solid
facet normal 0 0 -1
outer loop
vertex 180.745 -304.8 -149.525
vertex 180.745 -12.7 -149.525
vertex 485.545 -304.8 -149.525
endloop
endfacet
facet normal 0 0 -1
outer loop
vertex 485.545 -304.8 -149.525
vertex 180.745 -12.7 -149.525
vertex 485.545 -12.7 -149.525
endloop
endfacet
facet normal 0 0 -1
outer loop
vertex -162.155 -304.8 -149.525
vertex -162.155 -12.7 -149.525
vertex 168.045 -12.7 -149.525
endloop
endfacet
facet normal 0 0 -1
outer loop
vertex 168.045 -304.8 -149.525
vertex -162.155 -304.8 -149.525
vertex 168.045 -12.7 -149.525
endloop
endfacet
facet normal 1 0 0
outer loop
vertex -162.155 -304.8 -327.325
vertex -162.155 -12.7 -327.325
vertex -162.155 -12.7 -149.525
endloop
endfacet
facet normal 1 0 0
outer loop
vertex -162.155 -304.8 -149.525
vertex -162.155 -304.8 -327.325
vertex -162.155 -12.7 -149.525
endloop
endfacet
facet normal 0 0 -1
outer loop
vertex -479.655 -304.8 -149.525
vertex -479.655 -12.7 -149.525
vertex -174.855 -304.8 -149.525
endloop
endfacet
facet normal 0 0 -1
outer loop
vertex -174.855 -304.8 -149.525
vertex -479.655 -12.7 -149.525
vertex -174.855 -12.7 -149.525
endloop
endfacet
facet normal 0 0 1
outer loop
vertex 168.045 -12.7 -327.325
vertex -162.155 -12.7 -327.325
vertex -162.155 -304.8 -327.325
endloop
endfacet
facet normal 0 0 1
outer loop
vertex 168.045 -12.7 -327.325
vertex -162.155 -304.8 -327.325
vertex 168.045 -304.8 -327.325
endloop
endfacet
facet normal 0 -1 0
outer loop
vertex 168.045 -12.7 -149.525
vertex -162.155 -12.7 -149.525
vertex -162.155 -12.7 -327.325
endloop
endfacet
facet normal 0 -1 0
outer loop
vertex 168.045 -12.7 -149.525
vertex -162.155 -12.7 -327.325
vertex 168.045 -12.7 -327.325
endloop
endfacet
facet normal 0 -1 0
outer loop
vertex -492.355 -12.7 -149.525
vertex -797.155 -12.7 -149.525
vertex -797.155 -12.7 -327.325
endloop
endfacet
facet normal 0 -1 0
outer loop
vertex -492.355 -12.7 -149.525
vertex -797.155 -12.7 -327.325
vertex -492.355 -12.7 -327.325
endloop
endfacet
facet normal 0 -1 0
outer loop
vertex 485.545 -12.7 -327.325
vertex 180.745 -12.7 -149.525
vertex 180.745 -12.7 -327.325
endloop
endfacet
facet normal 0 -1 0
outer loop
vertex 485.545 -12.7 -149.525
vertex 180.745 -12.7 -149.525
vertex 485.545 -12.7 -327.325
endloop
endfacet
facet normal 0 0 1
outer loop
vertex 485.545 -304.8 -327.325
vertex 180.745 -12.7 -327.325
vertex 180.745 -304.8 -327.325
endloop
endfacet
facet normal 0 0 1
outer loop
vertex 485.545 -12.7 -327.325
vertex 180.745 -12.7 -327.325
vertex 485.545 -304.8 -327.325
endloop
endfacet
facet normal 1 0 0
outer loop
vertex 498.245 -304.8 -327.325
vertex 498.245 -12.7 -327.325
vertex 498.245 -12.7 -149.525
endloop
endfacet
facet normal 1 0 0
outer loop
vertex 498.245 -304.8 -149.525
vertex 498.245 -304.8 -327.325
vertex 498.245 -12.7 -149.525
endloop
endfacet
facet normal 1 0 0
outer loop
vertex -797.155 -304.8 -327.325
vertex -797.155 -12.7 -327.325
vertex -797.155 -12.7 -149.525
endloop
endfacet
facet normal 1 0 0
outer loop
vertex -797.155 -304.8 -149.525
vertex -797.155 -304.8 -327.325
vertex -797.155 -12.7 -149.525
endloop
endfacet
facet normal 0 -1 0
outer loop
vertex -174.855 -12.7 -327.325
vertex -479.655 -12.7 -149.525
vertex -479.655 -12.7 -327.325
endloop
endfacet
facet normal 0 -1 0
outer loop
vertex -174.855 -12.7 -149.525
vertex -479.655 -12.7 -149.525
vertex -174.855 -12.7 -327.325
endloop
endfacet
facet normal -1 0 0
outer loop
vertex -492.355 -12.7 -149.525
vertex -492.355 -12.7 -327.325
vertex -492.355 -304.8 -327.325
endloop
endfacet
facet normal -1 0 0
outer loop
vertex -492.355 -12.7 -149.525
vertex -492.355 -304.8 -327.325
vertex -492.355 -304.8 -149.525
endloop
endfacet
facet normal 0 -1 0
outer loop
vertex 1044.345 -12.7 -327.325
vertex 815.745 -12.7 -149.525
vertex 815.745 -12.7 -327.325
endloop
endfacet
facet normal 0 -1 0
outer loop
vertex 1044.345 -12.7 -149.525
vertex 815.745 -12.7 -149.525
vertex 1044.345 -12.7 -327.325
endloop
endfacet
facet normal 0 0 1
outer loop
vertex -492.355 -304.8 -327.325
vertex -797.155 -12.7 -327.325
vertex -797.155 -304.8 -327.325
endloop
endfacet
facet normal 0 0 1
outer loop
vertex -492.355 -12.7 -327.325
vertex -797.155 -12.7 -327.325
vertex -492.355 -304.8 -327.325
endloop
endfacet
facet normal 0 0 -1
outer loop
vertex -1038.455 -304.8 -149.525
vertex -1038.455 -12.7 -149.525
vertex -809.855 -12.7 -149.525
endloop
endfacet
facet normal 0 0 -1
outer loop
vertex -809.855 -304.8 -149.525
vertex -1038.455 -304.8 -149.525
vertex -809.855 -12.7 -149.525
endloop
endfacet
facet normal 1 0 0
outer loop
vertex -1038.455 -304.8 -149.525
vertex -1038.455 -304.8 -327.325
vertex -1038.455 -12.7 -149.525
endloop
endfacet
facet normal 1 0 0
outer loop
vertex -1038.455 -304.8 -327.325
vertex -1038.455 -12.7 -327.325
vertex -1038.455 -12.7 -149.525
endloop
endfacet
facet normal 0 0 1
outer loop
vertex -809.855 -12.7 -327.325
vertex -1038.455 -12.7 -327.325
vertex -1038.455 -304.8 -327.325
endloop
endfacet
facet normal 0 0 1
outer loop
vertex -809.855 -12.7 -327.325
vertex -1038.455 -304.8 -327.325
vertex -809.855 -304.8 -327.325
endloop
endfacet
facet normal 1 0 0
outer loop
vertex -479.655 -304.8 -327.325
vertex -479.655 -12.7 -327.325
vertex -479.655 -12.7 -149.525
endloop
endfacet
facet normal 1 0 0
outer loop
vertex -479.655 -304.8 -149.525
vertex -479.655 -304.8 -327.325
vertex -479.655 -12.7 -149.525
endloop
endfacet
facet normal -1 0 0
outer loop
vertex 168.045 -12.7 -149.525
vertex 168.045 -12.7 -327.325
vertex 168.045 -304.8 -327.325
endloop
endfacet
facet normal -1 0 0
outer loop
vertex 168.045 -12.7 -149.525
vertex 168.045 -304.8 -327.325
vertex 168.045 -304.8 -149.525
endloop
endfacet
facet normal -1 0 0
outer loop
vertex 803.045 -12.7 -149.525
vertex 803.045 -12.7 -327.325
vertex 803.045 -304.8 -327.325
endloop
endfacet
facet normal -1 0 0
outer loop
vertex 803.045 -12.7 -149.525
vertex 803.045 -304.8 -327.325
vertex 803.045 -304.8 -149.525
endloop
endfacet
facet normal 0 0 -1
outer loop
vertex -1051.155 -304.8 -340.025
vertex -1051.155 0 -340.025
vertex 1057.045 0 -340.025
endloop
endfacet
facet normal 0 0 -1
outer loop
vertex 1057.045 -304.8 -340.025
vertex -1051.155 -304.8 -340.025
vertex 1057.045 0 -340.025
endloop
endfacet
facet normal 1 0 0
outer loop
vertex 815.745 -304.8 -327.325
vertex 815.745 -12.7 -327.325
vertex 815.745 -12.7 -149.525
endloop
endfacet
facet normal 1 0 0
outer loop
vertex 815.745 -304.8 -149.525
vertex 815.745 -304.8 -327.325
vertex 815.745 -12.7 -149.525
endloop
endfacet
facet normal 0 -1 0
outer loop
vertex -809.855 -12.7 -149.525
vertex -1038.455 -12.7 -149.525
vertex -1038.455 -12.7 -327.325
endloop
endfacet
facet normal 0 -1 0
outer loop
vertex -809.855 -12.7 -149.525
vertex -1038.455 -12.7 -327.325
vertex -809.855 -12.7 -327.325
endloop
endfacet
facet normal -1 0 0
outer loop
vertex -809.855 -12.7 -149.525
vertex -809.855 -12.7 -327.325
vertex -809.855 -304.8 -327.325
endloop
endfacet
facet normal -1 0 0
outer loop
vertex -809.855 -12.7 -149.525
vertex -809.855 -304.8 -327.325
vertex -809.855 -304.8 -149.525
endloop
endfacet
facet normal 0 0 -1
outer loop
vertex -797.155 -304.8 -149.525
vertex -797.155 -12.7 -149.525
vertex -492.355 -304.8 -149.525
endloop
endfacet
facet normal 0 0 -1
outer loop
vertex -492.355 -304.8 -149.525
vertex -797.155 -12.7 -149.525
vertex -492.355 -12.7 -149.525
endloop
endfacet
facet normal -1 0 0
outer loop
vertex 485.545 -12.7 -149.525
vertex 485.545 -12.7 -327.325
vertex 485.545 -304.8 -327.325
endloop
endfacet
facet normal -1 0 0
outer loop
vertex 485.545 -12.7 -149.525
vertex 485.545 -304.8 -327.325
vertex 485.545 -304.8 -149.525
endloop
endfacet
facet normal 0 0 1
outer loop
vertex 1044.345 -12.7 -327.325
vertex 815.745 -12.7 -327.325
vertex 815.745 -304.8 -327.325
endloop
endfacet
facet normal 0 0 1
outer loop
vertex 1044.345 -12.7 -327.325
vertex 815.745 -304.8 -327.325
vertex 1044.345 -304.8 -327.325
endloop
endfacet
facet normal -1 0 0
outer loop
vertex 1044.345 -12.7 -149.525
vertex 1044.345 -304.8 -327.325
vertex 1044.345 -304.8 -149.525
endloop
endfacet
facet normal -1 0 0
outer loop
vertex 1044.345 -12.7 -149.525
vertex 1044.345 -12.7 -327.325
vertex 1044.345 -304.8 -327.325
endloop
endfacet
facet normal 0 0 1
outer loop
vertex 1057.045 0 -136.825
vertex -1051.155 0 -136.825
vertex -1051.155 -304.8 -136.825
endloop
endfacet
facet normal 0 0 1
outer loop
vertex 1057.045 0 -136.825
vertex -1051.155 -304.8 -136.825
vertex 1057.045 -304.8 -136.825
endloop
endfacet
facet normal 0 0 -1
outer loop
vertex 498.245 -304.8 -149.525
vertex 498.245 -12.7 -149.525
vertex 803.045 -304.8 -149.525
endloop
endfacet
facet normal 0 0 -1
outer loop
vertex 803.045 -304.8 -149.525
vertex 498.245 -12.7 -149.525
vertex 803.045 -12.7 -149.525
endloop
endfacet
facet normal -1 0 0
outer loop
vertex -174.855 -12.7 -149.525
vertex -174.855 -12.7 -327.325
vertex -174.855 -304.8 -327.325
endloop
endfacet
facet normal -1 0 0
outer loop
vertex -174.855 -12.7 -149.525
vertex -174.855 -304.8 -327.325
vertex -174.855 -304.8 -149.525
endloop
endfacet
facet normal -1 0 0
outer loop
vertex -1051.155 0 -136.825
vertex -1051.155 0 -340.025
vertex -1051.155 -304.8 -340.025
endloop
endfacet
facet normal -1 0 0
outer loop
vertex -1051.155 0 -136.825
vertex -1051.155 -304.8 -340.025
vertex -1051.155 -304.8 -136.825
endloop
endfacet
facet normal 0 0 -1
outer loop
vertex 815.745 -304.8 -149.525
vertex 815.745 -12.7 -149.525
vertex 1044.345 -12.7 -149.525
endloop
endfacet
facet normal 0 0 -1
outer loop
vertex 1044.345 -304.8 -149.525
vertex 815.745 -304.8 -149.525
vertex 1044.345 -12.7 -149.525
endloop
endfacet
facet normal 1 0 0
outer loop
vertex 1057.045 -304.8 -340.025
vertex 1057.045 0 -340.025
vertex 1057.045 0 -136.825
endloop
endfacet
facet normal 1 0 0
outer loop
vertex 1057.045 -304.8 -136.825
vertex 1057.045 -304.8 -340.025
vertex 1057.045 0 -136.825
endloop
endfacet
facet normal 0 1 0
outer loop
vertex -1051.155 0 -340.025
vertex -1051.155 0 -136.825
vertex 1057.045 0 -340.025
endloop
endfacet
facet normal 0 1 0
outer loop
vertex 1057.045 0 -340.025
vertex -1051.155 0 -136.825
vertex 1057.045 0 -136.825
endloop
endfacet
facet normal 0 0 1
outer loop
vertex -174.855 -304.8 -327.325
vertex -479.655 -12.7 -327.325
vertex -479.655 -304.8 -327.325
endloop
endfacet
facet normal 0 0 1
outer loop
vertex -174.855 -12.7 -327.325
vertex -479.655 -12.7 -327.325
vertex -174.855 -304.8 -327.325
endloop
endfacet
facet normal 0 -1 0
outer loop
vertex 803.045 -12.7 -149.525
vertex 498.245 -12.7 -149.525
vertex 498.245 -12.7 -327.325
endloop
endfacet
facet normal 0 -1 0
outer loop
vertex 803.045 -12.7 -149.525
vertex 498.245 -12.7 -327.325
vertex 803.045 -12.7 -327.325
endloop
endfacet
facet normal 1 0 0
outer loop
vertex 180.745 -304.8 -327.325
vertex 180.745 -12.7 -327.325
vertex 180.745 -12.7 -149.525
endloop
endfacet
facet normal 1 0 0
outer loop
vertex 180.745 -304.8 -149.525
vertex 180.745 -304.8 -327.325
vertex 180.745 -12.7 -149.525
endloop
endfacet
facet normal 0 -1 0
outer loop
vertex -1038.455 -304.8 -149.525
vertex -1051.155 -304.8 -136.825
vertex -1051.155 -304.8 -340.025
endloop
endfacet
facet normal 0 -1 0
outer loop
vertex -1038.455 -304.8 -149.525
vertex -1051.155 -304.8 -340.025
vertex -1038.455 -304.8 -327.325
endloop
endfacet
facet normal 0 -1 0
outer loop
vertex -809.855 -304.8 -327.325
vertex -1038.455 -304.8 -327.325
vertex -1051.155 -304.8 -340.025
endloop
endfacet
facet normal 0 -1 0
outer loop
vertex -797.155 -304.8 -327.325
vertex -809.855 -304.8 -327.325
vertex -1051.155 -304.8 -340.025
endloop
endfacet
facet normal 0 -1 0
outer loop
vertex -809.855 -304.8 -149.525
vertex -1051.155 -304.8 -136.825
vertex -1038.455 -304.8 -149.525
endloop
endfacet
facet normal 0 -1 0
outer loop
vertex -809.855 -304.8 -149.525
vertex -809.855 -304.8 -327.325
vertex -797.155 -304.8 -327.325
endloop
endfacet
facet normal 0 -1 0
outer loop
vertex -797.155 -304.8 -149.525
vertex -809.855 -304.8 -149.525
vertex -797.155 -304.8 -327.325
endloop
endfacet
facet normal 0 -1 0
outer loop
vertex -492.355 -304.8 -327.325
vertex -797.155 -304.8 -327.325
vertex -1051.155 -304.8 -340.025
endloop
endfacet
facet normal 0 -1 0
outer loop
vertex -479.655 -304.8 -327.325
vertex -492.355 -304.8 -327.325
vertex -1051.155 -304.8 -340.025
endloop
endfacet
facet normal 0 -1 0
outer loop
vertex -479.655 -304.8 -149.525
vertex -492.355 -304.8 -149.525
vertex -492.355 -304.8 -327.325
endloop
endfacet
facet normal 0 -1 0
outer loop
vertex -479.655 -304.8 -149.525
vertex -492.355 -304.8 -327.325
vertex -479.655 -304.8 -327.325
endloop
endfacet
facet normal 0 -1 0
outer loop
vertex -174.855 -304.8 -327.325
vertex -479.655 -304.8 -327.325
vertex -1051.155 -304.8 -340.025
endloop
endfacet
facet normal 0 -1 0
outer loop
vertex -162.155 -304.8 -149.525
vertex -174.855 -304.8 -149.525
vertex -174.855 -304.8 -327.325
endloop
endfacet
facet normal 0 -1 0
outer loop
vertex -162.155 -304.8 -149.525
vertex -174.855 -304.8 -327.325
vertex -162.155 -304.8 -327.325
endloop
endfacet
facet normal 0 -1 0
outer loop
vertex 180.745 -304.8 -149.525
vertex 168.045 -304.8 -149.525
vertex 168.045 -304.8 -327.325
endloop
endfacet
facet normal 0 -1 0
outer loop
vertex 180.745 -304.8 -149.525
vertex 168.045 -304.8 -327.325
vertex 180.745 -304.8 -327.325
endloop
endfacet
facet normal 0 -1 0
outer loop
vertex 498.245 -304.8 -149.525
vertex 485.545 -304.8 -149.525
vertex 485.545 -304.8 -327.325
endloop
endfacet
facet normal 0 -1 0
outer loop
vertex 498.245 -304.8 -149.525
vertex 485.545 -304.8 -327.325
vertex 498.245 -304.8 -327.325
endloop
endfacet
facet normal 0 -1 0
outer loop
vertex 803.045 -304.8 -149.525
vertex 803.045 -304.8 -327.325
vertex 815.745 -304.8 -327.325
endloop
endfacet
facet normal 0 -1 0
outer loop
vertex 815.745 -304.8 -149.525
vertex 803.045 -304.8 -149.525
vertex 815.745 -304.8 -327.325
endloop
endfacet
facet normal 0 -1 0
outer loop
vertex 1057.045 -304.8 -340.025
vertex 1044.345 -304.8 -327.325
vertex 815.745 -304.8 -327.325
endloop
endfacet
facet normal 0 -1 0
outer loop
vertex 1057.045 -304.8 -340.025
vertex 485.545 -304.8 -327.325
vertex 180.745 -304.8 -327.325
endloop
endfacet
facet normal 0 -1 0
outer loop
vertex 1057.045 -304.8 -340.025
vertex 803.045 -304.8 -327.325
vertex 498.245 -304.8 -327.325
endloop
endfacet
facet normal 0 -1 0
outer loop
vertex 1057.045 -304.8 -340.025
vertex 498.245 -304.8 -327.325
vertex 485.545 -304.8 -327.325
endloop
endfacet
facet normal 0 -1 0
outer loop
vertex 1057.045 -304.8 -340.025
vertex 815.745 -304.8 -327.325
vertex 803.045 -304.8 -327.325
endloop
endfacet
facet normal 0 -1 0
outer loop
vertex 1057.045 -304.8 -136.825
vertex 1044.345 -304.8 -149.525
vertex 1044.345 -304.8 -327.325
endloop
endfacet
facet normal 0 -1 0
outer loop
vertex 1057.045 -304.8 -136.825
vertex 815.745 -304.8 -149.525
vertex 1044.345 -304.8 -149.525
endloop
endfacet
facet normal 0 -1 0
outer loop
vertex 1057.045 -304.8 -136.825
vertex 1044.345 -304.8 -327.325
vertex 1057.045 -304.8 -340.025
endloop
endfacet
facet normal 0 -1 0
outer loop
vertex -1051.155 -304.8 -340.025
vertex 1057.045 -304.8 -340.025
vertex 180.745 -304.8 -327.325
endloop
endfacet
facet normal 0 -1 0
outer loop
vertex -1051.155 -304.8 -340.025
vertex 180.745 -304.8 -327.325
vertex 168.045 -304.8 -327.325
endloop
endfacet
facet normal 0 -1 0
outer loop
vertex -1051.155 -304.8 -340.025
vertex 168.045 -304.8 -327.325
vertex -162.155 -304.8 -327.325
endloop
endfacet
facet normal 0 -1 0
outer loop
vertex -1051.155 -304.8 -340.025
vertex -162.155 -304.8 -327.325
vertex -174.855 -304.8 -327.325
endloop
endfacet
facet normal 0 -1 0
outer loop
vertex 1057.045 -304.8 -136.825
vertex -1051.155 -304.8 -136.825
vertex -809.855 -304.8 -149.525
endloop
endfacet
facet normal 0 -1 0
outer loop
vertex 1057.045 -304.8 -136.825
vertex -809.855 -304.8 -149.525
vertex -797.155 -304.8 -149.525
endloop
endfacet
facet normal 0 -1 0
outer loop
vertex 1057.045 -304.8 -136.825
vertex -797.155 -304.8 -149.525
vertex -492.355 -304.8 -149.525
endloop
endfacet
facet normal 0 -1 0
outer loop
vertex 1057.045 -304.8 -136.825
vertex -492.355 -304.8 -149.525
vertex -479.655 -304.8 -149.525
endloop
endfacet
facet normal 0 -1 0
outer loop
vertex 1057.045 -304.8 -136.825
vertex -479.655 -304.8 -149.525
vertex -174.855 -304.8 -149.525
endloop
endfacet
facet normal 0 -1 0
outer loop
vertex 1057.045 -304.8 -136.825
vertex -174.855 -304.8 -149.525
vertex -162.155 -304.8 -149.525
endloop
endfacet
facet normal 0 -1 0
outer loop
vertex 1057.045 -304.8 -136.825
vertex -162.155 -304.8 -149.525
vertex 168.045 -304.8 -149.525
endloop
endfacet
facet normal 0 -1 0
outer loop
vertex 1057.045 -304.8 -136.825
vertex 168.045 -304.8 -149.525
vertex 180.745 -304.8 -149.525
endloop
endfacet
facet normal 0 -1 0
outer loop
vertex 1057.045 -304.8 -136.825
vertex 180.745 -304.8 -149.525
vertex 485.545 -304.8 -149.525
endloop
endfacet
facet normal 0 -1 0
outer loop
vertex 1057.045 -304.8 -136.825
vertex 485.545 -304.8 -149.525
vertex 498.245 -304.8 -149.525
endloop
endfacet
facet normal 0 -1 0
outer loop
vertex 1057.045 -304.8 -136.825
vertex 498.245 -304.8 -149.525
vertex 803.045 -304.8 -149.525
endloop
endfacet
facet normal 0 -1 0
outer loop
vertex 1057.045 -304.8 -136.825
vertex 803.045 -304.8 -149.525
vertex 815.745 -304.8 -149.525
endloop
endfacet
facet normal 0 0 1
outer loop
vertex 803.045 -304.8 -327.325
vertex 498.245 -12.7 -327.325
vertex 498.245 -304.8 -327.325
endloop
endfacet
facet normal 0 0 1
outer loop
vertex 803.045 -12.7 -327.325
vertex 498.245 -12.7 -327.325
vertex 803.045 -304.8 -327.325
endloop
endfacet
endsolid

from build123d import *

# Parameters (mm, degrees)
F0_W     = 2108.2
F0_H     = 203.2
F1_DEPTH = 304.8
F2_T     = -12.7
F3_W     = 12.7
F3_H     = 177.8
F4_DEPTH = 292.1


with BuildPart() as f1:
    # F0 (on Front) → F1 (new body)
    with BuildSketch(Plane.XZ):
        with Locations((2.945067, -238.425421)):
            Rectangle(F0_W, F0_H)
    extrude(amount=F1_DEPTH)

    # F2
    f2_openings = [f1.faces().sort_by_distance(p)[0] for p in [
        (2.945067, -304.8, -238.425421),
    ]]
    offset(amount=F2_T, openings=f2_openings)

    # F3 (on face) → F4 (join)
    with BuildSketch(Plane.XZ.offset(12.7)):
        with Locations((-803.504933, -238.425421)):
            Rectangle(F3_W, F3_H)
        with Locations((-486.004933, -238.425421)):
            Rectangle(F3_W, F3_H)
        with Locations((-168.504933, -238.425421)):
            Rectangle(F3_W, F3_H)
        with Locations((174.395067, -238.425421)):
            Rectangle(F3_W, F3_H)
        with Locations((491.895067, -238.425421)):
            Rectangle(F3_W, F3_H)
        with Locations((809.395067, -238.425421)):
            Rectangle(F3_W, F3_H)
    extrude(amount=F4_DEPTH)


solid = f1.part
